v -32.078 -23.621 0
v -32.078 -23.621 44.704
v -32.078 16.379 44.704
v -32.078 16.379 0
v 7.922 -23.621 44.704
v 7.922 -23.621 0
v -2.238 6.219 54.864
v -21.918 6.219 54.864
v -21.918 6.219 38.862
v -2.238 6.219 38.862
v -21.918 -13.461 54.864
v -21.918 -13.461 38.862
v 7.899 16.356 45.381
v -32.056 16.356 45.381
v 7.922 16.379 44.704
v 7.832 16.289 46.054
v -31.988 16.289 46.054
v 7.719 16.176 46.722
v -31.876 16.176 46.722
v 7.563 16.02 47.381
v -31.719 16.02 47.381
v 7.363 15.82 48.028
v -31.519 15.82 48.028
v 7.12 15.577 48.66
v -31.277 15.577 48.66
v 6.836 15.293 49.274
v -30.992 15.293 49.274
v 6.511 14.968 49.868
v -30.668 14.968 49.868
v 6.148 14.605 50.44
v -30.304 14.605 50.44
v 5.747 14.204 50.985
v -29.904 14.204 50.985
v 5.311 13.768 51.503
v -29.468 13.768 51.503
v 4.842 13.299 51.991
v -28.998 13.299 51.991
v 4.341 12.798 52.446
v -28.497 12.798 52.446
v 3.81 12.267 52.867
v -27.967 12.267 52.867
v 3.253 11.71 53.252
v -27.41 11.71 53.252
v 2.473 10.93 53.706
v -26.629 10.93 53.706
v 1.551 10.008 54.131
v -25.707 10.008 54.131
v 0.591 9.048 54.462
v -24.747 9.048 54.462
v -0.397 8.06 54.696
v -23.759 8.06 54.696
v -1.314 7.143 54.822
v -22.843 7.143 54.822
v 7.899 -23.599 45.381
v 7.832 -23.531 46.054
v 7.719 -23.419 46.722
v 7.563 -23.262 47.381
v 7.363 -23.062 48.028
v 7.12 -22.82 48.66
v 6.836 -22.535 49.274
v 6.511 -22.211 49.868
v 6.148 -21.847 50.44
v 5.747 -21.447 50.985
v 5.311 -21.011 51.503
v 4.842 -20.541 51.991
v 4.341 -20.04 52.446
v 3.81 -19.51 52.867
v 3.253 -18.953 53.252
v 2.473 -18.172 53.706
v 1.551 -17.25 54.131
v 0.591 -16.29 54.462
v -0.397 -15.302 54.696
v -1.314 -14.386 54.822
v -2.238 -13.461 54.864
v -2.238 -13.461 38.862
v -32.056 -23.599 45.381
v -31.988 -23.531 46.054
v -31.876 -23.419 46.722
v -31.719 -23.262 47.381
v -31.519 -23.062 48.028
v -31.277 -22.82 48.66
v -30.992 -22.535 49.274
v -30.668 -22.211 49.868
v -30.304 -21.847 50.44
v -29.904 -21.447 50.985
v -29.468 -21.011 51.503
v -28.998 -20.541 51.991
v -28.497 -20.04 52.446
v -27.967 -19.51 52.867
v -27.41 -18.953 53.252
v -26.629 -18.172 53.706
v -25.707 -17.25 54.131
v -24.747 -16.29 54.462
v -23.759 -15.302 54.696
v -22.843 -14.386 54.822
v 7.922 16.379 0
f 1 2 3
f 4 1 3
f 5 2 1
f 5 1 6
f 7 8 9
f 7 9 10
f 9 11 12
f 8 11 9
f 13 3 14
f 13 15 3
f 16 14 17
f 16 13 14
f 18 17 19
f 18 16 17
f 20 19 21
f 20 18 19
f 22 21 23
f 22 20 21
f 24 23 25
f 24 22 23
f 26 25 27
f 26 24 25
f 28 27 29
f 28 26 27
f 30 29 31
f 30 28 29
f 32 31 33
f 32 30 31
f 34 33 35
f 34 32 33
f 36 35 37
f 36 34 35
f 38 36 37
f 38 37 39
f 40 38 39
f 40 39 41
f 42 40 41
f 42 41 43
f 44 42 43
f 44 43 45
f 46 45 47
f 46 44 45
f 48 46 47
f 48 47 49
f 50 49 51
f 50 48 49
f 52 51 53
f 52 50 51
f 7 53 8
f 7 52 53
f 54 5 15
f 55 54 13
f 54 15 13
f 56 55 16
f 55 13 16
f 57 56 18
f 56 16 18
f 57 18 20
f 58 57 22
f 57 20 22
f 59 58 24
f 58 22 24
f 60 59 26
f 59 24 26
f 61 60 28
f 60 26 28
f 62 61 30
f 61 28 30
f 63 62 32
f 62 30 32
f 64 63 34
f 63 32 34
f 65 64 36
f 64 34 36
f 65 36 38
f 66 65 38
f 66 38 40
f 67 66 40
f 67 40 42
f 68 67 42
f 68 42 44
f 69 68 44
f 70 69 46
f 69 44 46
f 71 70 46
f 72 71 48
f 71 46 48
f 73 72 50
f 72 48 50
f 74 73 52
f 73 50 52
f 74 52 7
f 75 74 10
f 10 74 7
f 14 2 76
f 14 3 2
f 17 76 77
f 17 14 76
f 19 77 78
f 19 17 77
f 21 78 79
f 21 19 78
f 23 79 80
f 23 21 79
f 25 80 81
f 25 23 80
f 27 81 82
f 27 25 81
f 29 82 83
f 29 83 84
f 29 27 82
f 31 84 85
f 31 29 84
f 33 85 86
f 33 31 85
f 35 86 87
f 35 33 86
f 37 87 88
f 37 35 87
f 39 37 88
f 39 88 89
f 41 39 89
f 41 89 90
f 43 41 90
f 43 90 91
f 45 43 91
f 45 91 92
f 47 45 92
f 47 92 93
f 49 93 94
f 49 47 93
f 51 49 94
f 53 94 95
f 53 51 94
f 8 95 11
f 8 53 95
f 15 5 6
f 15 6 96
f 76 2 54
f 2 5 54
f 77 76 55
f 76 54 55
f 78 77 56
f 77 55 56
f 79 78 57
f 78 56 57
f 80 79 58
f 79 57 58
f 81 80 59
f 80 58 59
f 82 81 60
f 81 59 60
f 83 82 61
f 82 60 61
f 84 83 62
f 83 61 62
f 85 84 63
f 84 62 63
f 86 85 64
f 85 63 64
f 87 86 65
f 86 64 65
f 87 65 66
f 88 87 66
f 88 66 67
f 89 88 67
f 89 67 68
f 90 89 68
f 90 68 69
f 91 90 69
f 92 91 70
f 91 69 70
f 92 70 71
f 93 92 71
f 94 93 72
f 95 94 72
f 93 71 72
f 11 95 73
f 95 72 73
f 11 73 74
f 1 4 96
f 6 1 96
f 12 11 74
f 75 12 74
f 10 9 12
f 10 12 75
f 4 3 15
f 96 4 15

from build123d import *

# Parameters (mm, degrees)
F0_W      = 40
F0_H      = 40
F1_DEPTH  = 54.864
F2_R      = 10.16
F1_FACE_W = 19.68
F1_FACE_H = 19.68
F3_DEPTH  = 16.002


with BuildPart() as f1:
    # F0 (on Top) → F1 (new body)
    with BuildSketch(Plane.XY):
        with Locations((-12.078214, -3.62122)):
            Rectangle(F0_W, F0_H)
    extrude(amount=F1_DEPTH)

    # F2
    f2_edges = [f1.edges().sort_by_distance(p)[0] for p in [
        (-12.078214, -23.62122, 54.864),
        (7.921786, -3.62122, 54.864),
        (-12.078214, 16.37878, 54.864),
        (-32.078214, -3.62122, 54.864),
    ]]
    fillet(f2_edges, radius=F2_R)

    # F1_face (on face) → F3 (cut)
    with BuildSketch(Plane(origin=(-12.078214, -3.62122, 54.864), x_dir=(1, 0, 0), z_dir=(0, 0, 1))):
        Rectangle(F1_FACE_W, F1_FACE_H)
    extrude(amount=-F3_DEPTH, mode=Mode.SUBTRACT)


solid = f1.part
